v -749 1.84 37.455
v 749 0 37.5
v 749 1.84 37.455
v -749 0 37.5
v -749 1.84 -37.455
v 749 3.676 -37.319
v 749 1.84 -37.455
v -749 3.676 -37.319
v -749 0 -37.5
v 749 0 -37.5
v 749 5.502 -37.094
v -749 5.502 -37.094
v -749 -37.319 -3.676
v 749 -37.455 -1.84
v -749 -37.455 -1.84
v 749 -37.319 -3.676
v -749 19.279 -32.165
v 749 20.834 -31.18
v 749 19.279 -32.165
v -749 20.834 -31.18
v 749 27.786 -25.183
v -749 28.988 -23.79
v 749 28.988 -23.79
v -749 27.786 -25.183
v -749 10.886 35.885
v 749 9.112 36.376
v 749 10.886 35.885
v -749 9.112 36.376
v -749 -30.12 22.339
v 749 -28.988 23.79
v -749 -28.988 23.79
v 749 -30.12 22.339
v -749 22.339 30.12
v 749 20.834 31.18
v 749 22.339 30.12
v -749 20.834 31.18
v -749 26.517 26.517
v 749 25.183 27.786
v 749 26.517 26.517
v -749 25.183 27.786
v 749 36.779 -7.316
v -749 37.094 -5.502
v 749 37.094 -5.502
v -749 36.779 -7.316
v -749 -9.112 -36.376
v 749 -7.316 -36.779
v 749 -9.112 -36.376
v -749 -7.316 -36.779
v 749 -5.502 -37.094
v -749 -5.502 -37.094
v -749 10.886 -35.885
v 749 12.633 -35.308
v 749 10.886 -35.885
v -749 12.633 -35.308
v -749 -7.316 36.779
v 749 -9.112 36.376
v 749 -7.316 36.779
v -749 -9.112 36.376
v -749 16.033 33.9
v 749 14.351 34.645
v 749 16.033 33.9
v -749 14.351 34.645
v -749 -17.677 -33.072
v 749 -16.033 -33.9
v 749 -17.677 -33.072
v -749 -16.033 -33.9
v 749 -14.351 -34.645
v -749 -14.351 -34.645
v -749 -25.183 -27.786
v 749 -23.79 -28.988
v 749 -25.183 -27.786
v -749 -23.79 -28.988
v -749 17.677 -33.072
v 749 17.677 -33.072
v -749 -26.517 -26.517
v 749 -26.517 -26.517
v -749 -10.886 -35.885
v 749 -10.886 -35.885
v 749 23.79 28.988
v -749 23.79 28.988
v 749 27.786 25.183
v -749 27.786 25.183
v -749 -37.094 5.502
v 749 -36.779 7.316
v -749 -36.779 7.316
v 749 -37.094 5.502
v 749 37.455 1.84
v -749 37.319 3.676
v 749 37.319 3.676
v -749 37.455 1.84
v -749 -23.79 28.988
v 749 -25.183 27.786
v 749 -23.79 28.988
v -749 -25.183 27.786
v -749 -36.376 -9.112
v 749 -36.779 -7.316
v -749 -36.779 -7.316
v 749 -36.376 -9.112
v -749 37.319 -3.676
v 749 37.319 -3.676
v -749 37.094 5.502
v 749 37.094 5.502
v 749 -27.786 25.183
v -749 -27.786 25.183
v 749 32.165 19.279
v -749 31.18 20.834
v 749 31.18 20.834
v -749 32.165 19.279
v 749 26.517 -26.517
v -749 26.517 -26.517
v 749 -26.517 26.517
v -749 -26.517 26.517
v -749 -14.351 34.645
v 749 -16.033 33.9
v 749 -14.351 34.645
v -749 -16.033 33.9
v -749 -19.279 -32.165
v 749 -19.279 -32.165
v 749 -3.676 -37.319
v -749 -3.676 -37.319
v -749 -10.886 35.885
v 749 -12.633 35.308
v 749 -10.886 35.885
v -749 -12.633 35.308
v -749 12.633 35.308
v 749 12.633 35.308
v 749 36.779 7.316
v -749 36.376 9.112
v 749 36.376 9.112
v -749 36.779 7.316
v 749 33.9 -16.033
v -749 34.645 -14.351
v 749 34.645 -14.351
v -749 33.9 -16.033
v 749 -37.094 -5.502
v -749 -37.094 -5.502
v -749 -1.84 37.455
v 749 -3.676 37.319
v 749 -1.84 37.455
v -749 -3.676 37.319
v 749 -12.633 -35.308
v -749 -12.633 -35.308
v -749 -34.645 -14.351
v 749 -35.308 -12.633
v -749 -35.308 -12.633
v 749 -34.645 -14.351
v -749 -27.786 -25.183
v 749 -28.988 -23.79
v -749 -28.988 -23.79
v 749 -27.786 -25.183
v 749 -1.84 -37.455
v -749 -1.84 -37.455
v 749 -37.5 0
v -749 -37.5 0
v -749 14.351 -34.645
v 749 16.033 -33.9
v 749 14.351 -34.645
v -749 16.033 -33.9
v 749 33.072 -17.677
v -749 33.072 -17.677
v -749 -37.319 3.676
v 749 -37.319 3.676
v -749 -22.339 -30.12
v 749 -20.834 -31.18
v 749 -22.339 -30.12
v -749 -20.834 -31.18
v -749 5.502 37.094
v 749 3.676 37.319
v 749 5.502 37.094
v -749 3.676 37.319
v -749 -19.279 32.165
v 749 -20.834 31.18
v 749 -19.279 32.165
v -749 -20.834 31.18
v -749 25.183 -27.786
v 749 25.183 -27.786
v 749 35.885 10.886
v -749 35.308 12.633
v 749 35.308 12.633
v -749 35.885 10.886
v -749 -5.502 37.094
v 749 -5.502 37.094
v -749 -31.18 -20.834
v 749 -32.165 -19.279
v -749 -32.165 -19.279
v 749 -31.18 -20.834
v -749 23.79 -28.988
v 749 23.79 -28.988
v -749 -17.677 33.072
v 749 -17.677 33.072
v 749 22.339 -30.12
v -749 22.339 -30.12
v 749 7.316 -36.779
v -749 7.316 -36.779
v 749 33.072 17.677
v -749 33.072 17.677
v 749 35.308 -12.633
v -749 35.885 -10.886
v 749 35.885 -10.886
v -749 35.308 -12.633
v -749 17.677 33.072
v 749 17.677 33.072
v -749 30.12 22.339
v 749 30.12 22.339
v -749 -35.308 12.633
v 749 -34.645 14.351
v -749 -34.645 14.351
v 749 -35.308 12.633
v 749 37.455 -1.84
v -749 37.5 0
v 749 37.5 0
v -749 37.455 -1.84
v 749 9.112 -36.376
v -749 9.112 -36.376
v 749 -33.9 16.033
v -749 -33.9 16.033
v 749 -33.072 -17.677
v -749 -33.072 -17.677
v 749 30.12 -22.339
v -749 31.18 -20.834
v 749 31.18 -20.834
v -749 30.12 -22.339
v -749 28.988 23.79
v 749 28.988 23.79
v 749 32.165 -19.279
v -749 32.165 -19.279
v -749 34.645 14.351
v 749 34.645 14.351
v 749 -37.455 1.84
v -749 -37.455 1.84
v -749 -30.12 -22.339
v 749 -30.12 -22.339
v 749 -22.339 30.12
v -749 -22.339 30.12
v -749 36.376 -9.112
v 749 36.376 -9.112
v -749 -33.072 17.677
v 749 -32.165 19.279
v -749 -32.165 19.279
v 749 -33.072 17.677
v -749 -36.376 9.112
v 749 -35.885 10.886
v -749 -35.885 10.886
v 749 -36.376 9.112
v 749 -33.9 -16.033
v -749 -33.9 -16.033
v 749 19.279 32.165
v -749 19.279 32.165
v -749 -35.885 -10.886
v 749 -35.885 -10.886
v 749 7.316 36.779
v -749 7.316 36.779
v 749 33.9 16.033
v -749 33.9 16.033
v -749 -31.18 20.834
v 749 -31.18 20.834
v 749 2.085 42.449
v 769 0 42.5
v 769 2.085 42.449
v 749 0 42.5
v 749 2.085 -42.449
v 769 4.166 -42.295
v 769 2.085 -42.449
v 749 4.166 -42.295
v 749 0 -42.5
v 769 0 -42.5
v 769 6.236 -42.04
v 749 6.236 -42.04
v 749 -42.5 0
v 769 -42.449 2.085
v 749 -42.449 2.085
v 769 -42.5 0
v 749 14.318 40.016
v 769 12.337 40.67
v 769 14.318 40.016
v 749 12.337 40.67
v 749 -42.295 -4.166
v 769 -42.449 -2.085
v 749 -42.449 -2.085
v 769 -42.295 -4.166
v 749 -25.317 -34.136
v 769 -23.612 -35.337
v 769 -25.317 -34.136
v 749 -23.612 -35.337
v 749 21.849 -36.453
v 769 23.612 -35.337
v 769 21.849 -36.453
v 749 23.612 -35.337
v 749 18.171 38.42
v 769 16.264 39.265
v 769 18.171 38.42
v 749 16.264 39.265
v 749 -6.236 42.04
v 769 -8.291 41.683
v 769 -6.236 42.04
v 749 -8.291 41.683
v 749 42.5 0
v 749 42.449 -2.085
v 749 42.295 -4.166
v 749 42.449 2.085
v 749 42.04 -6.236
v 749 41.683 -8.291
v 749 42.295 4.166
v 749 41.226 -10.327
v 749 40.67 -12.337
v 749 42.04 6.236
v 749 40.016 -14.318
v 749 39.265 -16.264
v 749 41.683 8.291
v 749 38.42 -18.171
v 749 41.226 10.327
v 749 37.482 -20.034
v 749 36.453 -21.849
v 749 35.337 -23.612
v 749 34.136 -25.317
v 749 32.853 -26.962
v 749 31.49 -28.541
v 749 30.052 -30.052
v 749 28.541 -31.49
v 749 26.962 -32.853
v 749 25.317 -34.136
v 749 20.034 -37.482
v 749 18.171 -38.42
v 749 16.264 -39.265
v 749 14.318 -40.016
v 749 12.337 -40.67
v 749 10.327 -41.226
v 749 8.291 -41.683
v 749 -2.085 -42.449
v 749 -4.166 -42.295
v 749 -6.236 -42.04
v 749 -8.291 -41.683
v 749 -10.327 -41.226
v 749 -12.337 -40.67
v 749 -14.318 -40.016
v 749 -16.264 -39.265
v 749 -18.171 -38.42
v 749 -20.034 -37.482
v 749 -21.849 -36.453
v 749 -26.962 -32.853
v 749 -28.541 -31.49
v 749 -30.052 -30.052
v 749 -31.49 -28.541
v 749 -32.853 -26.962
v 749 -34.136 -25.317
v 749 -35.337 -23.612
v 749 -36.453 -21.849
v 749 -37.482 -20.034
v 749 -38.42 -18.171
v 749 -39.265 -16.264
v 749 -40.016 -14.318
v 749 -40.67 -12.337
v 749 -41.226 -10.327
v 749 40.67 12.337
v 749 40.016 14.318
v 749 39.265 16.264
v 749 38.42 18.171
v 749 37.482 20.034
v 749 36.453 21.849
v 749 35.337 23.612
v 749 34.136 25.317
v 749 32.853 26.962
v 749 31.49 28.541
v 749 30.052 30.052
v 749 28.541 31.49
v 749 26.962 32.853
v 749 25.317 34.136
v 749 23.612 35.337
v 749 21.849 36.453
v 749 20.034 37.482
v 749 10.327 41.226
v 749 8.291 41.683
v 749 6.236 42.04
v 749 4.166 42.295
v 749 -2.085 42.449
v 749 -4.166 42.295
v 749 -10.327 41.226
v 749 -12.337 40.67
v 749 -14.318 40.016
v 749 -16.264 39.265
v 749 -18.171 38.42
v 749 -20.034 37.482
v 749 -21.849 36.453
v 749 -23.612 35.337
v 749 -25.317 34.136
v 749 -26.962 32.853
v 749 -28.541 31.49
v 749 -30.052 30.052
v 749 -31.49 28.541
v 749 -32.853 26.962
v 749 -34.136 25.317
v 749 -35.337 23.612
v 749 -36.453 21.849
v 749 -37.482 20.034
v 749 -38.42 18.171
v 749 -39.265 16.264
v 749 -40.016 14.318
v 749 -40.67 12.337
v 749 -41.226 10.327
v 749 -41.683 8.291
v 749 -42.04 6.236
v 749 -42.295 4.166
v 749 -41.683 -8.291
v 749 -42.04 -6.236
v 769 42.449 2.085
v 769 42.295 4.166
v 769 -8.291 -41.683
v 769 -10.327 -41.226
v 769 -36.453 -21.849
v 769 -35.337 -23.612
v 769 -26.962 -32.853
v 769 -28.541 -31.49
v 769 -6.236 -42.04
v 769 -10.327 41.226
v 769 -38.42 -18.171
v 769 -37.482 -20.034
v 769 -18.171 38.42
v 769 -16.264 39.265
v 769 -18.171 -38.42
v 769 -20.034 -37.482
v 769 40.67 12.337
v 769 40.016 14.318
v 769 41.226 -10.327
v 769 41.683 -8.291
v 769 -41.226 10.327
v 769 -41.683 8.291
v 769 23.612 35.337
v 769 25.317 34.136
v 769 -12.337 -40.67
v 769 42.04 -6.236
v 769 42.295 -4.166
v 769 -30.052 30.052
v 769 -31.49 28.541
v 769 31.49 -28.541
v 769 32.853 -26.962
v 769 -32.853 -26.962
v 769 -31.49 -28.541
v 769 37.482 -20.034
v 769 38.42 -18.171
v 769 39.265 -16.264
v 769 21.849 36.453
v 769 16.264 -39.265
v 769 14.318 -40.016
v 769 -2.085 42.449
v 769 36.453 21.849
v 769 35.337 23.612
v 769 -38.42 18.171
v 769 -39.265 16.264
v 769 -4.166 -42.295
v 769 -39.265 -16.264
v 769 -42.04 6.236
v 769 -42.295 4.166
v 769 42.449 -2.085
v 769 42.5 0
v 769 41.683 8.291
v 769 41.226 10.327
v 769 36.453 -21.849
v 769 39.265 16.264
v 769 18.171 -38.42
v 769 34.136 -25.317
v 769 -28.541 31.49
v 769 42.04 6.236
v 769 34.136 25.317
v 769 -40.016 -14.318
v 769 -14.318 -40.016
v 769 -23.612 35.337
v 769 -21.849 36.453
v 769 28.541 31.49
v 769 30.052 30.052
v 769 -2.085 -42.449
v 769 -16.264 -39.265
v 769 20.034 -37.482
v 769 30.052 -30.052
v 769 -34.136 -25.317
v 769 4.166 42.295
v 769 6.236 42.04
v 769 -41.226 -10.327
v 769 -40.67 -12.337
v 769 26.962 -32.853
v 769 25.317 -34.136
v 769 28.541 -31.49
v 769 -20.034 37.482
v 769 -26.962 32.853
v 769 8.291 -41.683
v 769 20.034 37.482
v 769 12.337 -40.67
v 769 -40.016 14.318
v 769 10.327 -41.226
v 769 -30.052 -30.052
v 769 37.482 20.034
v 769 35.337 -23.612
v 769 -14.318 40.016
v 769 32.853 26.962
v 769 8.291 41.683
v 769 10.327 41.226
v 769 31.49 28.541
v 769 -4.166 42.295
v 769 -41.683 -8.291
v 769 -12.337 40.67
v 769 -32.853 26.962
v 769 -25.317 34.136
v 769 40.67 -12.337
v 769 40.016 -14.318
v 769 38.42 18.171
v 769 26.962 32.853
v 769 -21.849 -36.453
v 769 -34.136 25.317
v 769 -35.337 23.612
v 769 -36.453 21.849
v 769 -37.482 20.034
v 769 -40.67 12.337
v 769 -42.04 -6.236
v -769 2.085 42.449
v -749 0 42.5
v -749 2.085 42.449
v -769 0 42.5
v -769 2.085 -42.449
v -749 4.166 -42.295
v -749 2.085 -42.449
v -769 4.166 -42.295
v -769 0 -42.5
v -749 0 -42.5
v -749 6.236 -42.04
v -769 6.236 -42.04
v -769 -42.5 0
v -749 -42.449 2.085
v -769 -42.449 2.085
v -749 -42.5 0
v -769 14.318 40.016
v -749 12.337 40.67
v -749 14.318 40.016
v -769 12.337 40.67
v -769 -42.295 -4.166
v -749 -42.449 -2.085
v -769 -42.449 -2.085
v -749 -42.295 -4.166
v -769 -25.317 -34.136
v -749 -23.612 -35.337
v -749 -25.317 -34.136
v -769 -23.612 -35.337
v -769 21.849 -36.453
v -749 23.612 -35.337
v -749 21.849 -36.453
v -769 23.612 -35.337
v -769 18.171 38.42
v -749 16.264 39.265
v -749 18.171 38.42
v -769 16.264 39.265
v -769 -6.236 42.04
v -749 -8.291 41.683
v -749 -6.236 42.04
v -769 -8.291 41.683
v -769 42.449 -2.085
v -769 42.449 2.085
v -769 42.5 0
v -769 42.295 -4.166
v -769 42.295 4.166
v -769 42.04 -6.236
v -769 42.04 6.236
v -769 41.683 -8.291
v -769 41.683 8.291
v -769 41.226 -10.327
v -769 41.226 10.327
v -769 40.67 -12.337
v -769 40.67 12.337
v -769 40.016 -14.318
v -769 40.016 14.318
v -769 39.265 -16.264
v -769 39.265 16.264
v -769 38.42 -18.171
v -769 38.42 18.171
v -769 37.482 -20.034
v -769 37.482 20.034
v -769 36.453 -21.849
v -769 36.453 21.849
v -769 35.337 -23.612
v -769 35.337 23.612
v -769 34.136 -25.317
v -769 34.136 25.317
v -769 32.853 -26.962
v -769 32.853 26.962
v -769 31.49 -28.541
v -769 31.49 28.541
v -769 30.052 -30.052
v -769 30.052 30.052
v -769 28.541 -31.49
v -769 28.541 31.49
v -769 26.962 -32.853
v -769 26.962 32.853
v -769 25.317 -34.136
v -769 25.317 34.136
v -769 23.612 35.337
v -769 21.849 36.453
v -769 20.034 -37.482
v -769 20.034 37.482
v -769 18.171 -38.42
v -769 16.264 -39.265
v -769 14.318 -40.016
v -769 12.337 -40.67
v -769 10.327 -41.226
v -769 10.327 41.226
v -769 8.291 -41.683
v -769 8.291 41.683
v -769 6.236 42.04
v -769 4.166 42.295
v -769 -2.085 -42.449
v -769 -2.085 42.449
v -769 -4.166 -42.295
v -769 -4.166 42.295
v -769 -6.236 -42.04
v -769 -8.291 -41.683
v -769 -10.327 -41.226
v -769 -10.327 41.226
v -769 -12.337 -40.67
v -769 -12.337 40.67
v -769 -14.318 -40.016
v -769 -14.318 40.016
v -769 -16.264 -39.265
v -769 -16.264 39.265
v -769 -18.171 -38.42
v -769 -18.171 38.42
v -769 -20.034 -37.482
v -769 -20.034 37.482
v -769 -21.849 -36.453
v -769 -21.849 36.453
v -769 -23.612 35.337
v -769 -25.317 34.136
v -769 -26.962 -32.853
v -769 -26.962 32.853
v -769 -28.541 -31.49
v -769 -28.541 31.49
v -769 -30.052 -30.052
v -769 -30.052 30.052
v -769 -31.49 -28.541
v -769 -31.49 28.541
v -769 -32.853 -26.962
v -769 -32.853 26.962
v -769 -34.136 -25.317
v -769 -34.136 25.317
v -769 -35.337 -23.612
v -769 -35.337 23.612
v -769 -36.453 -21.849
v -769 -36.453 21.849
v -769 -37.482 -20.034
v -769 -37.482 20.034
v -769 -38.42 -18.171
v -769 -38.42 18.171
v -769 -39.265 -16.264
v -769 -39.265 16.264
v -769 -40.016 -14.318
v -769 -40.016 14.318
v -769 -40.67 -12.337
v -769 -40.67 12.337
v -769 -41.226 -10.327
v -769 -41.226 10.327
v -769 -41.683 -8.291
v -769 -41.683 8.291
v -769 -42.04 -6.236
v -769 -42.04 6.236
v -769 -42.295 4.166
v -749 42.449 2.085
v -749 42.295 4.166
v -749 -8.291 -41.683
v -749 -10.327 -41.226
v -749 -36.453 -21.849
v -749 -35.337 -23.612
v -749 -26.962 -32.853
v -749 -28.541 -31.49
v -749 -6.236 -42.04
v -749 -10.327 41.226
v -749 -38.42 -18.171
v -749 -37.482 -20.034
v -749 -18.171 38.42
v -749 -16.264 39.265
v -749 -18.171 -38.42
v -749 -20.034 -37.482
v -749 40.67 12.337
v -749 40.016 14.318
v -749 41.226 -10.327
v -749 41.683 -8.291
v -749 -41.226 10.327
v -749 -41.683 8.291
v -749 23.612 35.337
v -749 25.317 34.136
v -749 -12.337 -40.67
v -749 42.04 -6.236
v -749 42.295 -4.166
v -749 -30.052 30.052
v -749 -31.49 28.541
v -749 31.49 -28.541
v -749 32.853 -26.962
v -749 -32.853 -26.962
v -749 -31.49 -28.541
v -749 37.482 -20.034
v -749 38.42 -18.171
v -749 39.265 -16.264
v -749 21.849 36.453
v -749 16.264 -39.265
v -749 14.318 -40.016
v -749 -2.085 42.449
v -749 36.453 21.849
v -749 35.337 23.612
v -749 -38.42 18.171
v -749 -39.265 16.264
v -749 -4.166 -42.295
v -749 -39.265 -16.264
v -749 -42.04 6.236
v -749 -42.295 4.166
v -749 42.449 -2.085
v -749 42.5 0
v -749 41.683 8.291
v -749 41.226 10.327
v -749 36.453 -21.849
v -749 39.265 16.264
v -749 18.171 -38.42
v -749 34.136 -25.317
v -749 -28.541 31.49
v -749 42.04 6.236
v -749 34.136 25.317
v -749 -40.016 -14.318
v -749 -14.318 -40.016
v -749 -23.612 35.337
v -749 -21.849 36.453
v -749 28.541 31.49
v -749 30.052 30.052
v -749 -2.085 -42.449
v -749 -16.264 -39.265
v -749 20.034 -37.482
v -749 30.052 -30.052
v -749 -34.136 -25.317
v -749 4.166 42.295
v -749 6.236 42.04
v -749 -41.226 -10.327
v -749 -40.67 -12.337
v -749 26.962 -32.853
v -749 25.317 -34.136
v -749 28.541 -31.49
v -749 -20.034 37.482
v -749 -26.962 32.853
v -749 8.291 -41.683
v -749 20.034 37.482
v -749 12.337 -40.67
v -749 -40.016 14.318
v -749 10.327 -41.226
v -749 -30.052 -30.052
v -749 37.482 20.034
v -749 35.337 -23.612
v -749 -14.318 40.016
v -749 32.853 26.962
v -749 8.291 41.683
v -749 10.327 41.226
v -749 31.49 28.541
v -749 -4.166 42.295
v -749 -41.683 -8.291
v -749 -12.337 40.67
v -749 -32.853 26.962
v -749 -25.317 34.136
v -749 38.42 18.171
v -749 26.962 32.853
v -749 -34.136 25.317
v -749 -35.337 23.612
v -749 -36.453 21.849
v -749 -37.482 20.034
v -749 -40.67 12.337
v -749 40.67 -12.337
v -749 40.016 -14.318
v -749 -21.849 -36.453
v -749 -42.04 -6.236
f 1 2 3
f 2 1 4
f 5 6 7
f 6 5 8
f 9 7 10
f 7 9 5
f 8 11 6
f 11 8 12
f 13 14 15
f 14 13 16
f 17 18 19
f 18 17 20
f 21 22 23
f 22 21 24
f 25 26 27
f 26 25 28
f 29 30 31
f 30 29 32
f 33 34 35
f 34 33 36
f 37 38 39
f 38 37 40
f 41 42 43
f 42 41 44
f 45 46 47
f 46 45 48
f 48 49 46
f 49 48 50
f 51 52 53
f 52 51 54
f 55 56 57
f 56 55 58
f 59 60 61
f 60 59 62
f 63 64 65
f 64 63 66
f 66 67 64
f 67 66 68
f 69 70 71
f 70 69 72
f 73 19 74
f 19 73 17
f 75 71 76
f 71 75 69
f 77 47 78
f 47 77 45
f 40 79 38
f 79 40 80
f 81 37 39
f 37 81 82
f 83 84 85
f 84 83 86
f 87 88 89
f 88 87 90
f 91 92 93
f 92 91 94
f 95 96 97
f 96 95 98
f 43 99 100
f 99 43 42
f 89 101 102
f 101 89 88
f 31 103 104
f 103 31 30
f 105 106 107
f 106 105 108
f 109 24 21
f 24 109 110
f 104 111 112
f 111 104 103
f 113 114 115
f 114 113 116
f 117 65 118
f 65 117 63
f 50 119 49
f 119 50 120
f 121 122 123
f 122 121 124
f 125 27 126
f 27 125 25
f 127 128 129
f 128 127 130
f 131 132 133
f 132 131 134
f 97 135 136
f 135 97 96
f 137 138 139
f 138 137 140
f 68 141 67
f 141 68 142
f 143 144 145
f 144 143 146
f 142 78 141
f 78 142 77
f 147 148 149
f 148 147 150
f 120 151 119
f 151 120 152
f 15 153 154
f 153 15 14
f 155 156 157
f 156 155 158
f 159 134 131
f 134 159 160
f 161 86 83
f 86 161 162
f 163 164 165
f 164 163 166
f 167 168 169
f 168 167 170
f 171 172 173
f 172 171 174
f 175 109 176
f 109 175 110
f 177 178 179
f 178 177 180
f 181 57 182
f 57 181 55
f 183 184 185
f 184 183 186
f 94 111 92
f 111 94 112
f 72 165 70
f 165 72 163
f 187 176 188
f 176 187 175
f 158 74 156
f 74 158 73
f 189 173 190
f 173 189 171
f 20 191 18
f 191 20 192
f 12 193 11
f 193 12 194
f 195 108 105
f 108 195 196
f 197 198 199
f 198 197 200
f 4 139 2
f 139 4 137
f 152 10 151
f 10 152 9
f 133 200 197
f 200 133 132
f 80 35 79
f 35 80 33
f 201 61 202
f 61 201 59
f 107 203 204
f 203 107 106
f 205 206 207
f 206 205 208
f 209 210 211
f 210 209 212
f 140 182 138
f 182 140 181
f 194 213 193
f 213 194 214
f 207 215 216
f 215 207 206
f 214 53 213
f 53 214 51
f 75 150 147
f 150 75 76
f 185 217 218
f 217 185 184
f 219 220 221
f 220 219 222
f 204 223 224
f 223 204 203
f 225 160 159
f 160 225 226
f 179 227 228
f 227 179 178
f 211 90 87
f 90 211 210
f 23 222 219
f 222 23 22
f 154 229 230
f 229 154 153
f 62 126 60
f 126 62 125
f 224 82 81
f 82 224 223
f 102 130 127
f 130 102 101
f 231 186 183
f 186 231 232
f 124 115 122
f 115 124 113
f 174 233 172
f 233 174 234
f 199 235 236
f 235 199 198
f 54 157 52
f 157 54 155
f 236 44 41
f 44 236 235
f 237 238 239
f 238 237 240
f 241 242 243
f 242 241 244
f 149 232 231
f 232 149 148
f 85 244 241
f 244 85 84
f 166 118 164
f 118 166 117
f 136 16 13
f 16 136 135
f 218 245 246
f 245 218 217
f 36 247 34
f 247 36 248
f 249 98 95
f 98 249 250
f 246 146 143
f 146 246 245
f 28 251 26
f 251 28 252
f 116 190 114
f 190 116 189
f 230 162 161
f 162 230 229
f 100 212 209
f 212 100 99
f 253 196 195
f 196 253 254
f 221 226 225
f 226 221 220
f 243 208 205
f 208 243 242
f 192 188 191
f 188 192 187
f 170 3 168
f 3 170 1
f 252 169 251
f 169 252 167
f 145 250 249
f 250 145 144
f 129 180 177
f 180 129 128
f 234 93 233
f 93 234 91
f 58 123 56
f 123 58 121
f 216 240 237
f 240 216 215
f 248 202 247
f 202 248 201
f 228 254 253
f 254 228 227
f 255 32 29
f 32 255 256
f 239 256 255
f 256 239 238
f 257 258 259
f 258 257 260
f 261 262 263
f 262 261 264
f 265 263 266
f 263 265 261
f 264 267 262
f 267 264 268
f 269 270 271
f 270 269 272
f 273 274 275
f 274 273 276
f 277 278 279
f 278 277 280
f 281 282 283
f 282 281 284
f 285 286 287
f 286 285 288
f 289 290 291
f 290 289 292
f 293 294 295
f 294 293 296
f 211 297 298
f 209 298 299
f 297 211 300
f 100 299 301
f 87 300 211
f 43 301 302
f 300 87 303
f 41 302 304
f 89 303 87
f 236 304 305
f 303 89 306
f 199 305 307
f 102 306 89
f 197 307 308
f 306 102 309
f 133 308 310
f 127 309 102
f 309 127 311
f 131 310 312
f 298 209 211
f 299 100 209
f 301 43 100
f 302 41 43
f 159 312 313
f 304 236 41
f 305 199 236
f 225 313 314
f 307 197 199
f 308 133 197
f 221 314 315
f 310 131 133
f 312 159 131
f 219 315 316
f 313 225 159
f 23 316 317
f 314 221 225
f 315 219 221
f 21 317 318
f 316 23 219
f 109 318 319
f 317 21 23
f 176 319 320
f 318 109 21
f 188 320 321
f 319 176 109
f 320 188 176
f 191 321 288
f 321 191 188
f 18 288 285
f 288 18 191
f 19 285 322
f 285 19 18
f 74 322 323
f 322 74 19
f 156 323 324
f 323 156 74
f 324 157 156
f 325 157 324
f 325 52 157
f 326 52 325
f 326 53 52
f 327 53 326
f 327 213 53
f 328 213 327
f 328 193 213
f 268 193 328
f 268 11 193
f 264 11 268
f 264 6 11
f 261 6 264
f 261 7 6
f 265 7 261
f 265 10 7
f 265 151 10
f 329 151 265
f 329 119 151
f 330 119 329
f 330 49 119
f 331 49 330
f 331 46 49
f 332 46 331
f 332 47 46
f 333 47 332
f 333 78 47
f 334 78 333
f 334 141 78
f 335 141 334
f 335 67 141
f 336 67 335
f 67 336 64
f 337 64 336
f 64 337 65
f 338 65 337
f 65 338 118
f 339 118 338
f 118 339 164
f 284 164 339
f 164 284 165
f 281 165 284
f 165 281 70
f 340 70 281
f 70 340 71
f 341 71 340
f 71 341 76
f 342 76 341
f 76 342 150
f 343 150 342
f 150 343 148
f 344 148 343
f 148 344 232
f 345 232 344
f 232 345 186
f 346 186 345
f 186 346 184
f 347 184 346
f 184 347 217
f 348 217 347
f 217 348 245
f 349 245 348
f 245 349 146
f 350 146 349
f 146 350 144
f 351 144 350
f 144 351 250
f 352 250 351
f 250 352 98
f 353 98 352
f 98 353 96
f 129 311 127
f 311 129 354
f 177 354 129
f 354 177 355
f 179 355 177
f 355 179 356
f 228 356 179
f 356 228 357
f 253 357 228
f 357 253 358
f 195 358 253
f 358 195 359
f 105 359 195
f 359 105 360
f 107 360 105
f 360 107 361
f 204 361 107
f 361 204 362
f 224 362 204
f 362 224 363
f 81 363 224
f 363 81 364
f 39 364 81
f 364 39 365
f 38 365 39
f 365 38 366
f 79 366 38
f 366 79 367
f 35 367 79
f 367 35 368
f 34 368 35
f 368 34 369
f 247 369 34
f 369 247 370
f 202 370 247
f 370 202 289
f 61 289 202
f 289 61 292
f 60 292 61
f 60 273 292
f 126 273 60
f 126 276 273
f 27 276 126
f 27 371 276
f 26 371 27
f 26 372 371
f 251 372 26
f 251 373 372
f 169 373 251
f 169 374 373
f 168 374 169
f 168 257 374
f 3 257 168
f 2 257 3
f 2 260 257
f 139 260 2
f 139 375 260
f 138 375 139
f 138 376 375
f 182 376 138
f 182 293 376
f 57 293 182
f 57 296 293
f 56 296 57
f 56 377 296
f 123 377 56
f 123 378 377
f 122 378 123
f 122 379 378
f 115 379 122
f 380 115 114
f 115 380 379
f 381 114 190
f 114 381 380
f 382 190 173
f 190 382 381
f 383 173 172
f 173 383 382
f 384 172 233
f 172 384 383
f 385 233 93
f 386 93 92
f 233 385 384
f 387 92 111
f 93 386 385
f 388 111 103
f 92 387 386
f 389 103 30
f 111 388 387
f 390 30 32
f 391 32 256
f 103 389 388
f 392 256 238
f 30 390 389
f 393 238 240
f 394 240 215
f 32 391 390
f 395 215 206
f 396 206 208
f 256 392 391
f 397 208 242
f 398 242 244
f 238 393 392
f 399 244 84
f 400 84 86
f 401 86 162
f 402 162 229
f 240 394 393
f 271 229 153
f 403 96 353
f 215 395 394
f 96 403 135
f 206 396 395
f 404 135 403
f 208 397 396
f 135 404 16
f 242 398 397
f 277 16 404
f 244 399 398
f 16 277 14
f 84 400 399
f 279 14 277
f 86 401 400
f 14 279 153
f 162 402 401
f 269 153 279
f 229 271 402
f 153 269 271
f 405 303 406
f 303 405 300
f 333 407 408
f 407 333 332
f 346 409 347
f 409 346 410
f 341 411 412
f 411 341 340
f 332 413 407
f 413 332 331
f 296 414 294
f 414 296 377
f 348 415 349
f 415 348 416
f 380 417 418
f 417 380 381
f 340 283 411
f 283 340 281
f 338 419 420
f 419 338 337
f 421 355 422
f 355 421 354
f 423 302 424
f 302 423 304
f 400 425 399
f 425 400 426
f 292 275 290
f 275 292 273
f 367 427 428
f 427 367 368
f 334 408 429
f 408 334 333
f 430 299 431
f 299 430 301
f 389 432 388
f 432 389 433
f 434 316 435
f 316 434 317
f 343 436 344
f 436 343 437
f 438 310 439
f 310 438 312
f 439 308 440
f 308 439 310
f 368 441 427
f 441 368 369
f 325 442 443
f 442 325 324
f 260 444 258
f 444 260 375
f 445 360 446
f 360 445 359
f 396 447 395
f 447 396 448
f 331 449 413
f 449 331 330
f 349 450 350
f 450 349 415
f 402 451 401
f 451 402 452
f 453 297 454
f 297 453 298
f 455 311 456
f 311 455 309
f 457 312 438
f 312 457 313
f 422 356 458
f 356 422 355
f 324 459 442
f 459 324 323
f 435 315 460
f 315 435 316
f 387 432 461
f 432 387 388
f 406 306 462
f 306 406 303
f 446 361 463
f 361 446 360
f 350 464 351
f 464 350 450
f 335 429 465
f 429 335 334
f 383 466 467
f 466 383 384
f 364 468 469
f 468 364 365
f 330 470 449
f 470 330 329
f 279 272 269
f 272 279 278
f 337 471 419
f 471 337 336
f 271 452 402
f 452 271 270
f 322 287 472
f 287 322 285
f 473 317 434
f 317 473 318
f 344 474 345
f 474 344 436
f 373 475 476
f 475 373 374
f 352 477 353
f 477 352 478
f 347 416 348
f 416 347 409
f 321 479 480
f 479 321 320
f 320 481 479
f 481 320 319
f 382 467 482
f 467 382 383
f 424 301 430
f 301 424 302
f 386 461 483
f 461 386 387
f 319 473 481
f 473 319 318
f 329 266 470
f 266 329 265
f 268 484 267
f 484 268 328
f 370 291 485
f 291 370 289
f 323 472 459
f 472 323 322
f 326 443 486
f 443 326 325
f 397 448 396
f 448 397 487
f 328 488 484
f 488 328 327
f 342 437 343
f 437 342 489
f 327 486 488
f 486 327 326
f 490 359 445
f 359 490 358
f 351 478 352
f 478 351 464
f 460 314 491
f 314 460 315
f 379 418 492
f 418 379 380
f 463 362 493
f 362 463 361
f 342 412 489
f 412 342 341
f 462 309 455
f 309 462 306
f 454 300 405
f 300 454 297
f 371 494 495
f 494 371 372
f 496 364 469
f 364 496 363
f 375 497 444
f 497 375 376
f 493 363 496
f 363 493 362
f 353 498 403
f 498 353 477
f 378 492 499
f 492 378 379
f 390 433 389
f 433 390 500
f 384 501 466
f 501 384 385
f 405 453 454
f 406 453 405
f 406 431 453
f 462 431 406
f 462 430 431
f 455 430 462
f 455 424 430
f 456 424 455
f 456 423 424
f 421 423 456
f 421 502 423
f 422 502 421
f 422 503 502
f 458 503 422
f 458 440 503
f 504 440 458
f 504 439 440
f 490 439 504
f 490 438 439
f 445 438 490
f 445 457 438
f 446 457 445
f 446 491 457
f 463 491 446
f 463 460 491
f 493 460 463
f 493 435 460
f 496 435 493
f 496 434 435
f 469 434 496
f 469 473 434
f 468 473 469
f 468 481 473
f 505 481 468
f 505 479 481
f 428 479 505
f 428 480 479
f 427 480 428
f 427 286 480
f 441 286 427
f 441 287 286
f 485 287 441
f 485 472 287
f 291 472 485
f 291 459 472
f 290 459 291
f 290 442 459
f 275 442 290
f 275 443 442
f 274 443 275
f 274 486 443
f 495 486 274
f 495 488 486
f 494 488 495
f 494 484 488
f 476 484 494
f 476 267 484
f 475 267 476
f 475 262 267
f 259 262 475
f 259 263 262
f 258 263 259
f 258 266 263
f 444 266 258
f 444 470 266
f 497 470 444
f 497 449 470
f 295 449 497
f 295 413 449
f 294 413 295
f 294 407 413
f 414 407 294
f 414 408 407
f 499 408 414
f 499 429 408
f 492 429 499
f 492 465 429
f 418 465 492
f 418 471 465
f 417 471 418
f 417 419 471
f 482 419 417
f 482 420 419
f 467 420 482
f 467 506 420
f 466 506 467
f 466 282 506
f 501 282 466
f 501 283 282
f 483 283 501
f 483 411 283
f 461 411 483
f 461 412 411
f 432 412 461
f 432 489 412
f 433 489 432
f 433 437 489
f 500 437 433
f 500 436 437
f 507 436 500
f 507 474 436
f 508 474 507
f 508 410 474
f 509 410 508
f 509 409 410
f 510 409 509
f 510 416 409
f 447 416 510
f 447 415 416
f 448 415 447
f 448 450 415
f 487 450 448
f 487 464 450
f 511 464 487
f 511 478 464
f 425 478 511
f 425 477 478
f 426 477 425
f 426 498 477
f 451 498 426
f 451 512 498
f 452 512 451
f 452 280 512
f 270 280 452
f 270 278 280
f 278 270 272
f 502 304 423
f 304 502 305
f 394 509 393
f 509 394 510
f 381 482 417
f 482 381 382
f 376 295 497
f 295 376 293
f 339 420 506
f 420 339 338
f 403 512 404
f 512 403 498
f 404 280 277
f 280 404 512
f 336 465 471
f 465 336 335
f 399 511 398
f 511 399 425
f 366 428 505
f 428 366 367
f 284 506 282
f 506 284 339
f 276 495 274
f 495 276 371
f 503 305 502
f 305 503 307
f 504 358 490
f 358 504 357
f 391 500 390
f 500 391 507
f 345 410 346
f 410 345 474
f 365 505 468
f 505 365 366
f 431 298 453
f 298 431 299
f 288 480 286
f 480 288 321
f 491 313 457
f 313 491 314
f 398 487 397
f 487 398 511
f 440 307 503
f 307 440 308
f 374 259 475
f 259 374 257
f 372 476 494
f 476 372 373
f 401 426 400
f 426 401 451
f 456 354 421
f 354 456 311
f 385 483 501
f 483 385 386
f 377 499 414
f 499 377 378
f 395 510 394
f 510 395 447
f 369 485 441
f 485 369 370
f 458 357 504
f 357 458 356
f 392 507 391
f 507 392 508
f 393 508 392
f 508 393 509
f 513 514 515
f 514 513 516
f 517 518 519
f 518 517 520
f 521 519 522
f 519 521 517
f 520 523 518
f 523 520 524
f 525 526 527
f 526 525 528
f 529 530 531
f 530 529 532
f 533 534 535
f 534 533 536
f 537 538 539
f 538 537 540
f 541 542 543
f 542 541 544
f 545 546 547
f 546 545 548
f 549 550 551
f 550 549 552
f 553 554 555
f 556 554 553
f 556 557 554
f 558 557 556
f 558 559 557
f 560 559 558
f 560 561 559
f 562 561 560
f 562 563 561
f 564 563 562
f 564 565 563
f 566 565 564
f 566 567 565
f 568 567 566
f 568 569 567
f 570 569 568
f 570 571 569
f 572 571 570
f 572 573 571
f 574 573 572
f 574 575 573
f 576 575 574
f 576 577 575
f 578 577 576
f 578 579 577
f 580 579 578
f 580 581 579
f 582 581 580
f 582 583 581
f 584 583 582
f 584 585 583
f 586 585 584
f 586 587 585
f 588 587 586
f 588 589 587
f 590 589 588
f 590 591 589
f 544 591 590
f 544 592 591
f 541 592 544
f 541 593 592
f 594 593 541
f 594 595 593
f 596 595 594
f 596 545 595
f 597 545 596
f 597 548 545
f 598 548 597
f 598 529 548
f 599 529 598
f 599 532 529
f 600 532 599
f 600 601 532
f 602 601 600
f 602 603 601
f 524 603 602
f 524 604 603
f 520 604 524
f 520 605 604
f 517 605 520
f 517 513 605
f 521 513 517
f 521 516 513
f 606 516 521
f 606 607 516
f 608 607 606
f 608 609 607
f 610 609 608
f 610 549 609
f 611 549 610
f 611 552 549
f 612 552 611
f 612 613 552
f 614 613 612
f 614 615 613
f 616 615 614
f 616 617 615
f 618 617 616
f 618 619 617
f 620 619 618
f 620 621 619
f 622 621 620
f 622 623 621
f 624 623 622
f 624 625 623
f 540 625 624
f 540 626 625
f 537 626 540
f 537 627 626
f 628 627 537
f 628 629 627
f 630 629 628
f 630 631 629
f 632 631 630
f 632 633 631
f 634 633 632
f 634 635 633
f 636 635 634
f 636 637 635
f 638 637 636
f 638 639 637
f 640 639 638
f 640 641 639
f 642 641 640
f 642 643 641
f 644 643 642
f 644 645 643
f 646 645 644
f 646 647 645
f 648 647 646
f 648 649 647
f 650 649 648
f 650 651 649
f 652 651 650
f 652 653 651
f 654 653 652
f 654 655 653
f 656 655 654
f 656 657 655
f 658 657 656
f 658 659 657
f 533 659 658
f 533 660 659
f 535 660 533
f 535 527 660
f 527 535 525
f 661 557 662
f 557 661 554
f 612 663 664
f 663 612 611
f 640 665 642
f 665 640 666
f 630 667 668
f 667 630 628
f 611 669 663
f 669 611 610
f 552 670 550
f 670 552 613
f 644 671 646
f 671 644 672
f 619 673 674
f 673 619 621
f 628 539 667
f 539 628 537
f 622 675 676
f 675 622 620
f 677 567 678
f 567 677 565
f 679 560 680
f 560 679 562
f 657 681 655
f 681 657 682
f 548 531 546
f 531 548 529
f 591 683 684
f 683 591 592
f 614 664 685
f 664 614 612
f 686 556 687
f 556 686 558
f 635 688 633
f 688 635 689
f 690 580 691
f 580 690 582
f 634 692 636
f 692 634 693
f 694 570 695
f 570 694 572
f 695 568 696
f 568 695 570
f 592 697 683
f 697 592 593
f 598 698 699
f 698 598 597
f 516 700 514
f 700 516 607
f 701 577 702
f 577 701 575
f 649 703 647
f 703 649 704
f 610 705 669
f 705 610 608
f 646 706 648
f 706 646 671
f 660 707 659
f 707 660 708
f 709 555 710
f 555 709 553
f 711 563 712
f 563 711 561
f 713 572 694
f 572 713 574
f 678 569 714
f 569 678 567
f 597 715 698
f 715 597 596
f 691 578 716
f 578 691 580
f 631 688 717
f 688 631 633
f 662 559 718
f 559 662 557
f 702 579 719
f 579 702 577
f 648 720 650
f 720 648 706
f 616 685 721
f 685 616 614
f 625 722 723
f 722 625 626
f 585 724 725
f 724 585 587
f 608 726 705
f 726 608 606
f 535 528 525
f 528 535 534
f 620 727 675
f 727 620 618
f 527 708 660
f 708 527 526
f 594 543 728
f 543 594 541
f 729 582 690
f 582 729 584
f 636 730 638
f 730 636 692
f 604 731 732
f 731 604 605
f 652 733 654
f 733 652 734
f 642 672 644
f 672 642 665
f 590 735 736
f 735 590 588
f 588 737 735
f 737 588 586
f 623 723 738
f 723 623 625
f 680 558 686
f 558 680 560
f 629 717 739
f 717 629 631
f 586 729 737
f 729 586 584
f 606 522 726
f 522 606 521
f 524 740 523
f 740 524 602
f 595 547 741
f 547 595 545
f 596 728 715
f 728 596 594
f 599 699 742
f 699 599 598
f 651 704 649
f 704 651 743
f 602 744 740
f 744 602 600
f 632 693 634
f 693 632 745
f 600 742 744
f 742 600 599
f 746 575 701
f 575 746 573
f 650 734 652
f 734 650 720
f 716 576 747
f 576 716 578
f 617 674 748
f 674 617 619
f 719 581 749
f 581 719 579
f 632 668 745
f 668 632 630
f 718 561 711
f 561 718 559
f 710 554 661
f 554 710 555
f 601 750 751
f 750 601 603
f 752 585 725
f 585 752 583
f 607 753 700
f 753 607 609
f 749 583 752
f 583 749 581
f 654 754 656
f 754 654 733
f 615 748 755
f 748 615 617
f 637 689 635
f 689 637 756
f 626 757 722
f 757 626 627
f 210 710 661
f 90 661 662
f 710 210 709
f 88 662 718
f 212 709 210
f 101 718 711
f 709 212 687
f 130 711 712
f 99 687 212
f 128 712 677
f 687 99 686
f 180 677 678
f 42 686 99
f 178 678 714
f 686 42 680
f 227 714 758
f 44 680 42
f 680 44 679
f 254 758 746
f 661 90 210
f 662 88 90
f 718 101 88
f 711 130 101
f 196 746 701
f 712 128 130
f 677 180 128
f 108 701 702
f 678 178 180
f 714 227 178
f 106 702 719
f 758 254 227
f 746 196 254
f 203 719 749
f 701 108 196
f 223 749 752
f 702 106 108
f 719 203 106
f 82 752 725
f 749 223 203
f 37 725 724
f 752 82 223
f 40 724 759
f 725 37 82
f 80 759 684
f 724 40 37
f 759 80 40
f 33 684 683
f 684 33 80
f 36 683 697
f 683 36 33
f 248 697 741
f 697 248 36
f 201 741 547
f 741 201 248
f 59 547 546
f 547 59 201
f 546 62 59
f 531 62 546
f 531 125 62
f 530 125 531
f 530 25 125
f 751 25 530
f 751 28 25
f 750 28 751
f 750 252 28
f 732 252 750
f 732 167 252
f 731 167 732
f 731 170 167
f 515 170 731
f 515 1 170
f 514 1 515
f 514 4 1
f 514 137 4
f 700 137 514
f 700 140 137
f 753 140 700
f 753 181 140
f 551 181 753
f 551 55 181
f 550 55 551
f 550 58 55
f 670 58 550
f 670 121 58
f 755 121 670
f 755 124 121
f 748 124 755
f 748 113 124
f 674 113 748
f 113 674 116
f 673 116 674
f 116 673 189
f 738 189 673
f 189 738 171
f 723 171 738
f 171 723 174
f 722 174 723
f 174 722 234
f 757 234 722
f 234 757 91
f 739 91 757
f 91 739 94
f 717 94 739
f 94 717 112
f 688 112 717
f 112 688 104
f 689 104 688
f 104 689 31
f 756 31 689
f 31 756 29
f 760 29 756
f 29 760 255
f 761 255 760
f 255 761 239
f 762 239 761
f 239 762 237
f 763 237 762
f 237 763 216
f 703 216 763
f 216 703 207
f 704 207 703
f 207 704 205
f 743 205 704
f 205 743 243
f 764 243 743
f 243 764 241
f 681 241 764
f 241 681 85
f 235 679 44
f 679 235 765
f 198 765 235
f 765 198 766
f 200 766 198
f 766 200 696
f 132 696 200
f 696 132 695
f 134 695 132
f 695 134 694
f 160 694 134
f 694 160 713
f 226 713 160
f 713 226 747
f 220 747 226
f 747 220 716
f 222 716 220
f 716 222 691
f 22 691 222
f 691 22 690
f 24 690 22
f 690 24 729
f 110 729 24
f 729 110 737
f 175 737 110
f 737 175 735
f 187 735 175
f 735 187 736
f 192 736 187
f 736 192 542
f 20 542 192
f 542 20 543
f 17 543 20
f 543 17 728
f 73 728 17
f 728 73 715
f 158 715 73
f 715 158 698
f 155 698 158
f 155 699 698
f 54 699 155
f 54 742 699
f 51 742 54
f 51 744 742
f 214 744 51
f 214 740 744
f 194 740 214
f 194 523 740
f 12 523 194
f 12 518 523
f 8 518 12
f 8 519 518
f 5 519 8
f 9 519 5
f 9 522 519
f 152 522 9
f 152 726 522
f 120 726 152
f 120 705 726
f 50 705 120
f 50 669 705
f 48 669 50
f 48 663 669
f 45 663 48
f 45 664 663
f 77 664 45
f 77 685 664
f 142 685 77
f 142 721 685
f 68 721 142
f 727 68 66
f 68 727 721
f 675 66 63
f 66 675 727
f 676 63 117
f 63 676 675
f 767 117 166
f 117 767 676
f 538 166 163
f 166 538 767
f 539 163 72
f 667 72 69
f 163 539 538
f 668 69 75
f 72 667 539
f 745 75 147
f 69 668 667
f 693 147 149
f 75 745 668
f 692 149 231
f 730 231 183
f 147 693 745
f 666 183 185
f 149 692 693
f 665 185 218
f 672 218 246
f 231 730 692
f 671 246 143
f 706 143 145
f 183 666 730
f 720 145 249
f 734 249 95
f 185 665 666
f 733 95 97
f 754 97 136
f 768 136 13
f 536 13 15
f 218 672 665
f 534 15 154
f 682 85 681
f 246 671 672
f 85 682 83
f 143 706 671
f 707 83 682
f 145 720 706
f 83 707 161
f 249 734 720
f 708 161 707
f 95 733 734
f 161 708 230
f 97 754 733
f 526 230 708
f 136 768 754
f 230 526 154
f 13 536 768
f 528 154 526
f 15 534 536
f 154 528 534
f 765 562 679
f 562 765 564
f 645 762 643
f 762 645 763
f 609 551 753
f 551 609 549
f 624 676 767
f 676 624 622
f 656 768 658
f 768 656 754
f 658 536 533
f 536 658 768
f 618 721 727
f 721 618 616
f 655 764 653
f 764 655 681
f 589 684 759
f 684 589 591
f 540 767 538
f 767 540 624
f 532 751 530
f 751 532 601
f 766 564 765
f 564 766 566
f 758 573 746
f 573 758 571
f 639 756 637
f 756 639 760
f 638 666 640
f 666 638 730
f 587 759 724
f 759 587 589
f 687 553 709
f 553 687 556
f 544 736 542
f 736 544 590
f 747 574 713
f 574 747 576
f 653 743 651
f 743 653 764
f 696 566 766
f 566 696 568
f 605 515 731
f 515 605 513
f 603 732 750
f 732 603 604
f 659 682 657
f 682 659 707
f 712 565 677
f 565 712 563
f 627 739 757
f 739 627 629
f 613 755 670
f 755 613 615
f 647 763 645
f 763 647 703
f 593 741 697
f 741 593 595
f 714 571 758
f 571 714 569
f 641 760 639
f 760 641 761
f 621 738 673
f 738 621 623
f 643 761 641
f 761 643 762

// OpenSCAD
$fn = 128;

module ht_pipe_body(diameter, length) {
    cylinder(d=diameter, h=length, center=true);
}

module end_fitting_geometry(diameter, h=20, flare=10) {
    cylinder(d=diameter + flare, h=h, center=true);
}

module ht_pipe(diameter, length) {
    fitting_h = 20;
    flare = 10;
    overlap = 1; // ensures positive overlap with body

    // Ensure the main body length is the requested 1500mm (overall length will be longer due to fittings)
    union() {
        ht_pipe_body(diameter, length);

        translate([0, 0, length/2 + fitting_h/2 - overlap])
            end_fitting_geometry(diameter, h=fitting_h, flare=flare);

        translate([0, 0, -length/2 - fitting_h/2 + overlap])
            end_fitting_geometry(diameter, h=fitting_h, flare=flare);
    }
}

// Rotate so the 1500mm length lies along X for visible front/back/left/right orthographic views
rotate([0, 90, 0])
    ht_pipe(75, 1500);
